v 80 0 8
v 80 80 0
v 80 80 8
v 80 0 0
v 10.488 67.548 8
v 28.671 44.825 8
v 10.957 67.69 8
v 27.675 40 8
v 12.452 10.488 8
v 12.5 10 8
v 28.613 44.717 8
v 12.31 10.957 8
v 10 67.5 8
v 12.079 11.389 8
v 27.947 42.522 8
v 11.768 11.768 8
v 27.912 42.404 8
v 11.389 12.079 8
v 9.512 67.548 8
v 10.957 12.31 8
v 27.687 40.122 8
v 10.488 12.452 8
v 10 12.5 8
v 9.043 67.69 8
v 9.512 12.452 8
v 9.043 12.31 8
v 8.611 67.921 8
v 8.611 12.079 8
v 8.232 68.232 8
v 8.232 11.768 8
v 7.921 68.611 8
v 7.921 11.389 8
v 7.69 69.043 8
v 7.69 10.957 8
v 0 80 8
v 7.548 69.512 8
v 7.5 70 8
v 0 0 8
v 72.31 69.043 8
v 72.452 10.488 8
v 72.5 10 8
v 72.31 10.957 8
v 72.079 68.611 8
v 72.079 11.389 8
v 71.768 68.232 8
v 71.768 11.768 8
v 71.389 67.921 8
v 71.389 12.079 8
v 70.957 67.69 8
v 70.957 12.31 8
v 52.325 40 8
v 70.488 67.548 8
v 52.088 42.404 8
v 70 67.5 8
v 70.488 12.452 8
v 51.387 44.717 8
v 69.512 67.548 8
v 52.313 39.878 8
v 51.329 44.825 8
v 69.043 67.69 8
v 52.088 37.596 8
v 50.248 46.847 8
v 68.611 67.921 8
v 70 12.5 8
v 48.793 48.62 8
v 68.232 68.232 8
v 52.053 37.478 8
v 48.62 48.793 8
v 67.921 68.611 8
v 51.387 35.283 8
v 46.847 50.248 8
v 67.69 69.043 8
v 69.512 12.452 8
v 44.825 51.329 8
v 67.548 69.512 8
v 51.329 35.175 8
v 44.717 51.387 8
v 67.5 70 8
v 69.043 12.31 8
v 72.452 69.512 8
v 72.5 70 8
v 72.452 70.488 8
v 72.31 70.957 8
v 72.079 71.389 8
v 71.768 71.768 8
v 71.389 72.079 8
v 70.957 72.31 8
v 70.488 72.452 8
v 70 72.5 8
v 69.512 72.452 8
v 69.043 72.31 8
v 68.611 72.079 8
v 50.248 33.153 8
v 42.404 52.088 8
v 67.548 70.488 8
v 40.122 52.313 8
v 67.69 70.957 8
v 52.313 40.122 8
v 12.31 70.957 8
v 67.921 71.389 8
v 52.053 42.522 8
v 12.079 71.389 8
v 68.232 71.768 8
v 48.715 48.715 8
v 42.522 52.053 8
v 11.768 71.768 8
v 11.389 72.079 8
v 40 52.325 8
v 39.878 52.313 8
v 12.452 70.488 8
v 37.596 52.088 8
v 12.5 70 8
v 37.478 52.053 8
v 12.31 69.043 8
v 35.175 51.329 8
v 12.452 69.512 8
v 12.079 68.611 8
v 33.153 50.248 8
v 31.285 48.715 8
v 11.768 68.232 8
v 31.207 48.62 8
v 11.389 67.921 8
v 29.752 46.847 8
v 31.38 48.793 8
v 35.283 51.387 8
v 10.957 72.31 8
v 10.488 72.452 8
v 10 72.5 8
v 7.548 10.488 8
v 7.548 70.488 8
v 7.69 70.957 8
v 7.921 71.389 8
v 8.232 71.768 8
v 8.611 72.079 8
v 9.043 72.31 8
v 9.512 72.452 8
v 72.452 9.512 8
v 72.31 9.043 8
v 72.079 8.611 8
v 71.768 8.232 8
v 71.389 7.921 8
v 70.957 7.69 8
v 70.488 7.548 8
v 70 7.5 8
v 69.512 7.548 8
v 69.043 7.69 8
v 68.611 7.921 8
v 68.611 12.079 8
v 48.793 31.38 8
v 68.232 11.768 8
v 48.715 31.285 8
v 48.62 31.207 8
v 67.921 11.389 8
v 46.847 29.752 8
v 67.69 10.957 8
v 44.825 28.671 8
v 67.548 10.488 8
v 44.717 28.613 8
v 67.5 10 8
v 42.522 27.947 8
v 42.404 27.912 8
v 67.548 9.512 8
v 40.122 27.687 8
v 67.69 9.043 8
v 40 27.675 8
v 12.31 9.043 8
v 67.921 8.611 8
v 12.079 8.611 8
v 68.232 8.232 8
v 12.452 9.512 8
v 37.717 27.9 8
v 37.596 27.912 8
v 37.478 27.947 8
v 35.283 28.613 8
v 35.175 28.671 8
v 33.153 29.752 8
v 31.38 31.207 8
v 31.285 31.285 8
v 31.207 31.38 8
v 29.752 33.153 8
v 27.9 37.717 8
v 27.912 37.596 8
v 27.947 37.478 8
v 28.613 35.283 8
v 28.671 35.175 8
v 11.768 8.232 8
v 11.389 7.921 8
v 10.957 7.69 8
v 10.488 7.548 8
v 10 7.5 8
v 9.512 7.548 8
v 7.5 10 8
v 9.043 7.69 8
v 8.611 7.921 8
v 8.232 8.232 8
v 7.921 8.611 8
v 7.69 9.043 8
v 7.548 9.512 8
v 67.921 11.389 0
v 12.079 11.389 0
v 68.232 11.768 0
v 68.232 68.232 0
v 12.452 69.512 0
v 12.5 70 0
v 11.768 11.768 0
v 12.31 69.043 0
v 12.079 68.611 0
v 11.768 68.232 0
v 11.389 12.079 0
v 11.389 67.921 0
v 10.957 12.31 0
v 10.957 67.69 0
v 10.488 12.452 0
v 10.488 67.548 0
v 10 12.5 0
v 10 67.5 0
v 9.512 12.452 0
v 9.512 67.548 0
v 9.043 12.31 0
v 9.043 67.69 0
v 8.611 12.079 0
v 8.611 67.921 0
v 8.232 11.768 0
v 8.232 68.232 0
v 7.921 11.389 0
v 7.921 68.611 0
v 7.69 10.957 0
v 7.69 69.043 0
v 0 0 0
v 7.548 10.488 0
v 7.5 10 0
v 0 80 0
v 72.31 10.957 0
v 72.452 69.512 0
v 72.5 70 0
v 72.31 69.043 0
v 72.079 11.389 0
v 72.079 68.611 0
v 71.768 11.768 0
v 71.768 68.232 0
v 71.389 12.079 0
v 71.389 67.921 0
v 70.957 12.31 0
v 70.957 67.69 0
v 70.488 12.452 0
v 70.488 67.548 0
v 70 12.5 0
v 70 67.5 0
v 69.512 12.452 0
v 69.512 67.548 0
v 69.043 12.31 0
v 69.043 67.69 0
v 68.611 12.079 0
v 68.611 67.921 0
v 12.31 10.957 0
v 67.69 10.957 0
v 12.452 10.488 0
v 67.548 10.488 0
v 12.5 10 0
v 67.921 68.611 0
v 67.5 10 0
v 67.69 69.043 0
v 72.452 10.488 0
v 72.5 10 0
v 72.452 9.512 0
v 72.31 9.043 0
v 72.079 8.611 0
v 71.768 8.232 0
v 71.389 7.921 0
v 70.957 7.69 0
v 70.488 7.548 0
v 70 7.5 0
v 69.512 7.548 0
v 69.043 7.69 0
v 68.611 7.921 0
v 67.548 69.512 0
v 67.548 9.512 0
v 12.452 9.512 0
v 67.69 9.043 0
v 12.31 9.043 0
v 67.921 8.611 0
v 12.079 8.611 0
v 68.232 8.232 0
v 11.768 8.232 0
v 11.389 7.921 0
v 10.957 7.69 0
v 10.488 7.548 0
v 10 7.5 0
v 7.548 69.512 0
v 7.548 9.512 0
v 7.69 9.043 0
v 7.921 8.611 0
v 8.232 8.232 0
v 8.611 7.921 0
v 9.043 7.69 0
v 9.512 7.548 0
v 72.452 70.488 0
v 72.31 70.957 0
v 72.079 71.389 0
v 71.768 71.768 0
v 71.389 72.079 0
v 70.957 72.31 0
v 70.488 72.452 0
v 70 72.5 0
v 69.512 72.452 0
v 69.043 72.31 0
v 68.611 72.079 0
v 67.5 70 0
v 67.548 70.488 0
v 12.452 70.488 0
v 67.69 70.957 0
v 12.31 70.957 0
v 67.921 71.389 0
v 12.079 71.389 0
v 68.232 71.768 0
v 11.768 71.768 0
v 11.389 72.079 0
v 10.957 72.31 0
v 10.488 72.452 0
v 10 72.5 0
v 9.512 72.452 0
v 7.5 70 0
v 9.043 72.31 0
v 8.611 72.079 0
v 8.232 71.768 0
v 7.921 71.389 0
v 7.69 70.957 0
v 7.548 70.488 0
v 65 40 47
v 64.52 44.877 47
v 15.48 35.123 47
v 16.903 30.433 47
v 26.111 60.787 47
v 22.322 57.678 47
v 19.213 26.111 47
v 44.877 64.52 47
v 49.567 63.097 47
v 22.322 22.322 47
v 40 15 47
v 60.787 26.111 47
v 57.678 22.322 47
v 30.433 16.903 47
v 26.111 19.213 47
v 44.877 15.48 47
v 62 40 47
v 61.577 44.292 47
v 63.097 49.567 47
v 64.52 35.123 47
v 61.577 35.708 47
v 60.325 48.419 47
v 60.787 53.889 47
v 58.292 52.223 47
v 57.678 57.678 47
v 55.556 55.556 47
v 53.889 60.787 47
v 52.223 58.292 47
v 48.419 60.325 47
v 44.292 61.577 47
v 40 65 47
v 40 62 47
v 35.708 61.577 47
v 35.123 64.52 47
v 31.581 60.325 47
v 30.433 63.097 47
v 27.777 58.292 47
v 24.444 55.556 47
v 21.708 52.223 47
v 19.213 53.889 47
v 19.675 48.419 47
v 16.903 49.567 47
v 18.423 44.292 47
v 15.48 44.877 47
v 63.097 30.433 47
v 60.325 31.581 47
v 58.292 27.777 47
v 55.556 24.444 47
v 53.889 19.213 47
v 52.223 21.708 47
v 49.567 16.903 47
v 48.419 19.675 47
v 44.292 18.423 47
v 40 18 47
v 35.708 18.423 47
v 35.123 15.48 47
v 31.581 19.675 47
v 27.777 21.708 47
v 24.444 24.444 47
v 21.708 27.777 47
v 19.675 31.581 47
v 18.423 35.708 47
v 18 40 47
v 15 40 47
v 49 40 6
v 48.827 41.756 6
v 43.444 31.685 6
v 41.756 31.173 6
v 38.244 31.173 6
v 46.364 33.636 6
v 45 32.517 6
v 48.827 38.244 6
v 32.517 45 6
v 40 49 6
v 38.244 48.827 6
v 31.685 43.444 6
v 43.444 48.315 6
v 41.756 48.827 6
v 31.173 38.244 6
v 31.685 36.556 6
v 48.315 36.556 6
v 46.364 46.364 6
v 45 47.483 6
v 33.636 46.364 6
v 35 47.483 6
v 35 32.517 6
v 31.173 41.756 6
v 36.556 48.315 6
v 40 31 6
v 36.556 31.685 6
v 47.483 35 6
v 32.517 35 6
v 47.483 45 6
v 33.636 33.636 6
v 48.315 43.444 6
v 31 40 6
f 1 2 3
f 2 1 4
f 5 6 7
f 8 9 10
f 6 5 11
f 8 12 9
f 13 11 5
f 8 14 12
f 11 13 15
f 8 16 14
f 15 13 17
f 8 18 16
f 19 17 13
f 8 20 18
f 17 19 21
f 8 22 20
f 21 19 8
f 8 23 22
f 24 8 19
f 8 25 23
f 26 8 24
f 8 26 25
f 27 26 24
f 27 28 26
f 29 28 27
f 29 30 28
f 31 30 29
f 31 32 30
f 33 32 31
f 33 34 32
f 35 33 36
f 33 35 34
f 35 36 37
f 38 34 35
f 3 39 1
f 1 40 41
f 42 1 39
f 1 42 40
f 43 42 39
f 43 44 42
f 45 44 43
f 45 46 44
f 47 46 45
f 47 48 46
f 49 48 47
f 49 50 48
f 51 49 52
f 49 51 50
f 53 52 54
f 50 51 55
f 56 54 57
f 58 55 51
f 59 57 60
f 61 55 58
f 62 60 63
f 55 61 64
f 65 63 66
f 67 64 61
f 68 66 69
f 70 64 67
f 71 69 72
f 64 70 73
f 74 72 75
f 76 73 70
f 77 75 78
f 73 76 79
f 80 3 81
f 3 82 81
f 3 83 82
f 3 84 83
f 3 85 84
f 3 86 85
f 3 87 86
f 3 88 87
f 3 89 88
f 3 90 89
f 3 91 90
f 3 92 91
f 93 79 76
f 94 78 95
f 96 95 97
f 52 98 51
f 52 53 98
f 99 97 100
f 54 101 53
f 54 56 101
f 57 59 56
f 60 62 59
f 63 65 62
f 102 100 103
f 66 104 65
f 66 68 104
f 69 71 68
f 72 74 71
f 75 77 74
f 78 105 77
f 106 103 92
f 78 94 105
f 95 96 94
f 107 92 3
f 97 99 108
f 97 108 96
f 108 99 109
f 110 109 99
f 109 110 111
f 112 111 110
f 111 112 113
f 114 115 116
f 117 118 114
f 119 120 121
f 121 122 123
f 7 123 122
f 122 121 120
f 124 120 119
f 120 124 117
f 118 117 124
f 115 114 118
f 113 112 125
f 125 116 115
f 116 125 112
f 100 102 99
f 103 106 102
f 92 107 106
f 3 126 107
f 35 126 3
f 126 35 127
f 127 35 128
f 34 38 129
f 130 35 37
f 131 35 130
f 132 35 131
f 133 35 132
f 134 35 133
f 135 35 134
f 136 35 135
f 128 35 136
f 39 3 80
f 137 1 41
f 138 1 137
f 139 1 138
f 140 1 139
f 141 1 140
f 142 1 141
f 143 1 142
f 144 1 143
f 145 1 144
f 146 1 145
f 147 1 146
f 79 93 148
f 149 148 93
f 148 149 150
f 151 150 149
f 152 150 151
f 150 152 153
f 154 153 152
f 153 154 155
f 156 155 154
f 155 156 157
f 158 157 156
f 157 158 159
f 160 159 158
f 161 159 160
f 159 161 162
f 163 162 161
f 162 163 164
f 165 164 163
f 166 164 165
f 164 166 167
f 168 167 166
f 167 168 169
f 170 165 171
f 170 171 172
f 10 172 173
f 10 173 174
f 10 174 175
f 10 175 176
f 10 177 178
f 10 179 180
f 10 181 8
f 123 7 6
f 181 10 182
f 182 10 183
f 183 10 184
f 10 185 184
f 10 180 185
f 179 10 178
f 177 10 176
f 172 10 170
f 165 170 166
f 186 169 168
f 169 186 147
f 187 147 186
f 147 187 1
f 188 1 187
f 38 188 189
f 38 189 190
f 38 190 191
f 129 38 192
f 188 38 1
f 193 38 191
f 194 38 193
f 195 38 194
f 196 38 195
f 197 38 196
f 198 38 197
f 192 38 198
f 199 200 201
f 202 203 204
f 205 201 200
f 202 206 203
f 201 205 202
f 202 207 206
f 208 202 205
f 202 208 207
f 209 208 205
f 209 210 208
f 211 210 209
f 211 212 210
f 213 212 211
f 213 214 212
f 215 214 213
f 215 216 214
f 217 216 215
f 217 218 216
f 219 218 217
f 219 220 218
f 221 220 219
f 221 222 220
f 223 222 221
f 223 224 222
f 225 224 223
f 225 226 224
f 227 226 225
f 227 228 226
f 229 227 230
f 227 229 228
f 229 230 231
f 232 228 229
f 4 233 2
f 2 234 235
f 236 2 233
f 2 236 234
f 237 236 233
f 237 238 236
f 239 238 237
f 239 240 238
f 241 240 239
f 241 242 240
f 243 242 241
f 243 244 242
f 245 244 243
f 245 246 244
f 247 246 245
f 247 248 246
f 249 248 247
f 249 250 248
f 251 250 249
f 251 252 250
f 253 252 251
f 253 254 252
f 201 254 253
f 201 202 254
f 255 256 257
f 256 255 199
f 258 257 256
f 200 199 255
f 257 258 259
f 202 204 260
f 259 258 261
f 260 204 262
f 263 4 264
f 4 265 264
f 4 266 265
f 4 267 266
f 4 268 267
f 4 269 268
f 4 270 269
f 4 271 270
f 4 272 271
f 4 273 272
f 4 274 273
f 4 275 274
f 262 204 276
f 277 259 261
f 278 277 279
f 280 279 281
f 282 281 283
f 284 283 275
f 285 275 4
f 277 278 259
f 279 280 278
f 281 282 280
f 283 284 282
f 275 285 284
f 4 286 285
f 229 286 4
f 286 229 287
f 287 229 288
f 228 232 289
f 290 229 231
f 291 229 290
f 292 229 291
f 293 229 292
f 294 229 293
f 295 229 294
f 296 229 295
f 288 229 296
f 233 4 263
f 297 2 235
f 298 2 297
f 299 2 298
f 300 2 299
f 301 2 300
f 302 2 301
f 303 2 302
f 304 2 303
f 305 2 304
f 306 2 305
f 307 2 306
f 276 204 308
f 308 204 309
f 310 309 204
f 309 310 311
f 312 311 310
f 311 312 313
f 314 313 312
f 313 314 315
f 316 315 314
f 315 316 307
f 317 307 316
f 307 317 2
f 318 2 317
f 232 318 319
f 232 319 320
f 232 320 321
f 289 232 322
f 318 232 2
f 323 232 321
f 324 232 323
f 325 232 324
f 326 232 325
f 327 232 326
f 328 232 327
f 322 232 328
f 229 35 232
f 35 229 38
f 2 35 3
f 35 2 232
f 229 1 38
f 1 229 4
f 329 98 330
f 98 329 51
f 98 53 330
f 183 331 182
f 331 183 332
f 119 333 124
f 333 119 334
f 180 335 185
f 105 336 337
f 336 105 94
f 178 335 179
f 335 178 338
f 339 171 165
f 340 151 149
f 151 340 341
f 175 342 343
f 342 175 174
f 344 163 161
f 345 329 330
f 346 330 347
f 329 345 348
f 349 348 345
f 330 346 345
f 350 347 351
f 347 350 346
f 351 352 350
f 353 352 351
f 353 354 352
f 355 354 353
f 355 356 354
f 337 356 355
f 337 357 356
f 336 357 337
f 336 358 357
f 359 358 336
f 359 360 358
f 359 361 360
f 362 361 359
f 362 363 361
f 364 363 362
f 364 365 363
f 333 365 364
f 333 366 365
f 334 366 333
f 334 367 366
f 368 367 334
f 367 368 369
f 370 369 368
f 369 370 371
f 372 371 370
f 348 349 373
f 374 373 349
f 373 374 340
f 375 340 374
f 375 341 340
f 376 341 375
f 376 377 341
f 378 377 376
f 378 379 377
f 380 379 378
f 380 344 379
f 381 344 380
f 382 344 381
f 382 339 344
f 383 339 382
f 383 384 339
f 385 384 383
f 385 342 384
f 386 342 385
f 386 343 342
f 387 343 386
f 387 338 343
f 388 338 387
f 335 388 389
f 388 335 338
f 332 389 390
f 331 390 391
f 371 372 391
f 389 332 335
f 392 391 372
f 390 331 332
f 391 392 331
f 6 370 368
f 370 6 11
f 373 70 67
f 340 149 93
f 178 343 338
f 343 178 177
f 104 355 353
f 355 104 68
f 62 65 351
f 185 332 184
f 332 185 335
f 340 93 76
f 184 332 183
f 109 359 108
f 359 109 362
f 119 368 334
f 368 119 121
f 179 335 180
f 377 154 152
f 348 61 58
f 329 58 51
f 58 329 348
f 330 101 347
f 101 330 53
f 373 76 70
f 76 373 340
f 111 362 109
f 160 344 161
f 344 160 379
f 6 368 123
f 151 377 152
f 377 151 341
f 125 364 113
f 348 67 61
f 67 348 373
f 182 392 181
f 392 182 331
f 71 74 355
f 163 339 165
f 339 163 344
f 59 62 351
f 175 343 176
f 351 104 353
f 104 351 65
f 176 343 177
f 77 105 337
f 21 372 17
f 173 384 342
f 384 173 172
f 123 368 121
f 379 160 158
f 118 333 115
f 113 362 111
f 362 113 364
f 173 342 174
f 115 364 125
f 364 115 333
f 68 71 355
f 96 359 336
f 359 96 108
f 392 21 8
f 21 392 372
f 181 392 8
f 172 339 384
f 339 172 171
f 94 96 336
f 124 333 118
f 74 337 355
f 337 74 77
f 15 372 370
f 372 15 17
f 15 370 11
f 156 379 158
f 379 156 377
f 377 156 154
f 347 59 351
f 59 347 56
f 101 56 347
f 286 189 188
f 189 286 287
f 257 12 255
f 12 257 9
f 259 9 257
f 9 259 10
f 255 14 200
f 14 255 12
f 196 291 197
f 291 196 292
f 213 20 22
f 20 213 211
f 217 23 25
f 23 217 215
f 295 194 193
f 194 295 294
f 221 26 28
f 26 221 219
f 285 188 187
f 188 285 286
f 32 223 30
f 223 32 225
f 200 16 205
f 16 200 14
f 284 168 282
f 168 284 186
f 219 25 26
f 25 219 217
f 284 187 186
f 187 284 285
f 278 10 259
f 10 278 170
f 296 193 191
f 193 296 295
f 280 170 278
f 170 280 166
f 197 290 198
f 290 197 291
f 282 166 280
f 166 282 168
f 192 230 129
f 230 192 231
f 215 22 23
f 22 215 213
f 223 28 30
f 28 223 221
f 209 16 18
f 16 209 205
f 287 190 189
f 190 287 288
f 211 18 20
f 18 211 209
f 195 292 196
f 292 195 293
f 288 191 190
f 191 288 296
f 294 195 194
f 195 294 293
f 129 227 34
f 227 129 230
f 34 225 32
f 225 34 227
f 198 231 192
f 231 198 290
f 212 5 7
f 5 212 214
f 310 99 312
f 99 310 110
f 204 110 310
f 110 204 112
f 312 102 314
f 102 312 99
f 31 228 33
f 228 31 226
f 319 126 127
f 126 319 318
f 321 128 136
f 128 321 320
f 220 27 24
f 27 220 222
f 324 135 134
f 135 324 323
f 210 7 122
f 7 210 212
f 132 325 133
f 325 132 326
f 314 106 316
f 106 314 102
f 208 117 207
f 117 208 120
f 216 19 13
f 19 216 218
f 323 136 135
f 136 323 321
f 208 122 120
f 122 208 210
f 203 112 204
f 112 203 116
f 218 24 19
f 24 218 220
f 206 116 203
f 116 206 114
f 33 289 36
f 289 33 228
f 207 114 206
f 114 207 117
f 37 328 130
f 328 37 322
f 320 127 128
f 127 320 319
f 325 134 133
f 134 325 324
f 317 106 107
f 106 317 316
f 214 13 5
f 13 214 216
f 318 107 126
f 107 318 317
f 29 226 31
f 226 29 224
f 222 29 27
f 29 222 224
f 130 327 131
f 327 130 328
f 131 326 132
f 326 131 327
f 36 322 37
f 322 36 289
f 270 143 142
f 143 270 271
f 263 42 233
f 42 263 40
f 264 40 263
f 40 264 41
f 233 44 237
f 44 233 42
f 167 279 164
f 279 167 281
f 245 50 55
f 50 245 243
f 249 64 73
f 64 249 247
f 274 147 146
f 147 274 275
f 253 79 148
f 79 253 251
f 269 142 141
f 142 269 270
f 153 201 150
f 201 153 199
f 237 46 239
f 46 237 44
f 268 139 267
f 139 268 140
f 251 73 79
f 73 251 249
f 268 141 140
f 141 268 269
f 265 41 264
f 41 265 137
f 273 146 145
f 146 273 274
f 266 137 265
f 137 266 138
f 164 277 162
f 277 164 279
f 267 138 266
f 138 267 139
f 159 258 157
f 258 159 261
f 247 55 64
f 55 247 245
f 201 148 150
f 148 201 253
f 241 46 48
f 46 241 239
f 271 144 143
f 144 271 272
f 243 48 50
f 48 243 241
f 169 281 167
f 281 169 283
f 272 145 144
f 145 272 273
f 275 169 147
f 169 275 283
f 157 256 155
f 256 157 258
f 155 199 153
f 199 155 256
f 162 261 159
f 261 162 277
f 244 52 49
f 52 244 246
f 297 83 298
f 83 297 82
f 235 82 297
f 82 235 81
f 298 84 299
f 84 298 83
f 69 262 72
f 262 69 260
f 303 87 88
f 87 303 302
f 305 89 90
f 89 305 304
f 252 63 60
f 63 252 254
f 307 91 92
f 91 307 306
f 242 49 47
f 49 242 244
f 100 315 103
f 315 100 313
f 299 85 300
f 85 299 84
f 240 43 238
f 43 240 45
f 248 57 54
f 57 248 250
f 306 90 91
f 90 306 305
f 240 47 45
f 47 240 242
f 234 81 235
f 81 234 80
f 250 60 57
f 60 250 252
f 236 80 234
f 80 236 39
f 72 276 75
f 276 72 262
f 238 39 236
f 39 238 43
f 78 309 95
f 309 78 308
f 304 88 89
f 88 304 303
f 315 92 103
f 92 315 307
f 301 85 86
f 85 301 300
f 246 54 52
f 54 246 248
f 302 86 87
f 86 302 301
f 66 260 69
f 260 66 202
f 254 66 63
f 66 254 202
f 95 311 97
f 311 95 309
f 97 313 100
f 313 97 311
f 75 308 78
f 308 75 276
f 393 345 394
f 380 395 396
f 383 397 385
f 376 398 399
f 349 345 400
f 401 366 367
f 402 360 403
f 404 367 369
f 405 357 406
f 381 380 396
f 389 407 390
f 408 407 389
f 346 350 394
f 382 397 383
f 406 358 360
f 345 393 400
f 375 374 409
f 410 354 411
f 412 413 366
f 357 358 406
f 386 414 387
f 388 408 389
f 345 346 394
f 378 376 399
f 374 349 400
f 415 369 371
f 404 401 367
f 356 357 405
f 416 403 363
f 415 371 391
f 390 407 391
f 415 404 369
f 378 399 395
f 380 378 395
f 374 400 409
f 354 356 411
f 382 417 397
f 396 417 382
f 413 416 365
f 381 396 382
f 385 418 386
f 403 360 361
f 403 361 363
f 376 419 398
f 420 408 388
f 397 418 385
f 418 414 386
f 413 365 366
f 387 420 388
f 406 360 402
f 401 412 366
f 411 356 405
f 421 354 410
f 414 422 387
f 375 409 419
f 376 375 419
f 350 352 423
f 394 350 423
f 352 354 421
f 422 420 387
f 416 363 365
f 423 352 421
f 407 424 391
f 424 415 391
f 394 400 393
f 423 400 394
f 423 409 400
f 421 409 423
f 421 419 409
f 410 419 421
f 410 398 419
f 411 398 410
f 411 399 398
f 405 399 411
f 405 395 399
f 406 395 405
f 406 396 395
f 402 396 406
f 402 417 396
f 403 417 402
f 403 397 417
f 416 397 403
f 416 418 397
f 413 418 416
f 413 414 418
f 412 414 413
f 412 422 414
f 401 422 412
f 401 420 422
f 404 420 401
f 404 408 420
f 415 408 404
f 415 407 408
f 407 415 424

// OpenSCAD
$fn = 32;

// ----------------------------------------------------------------------
// Hopper: flanged with square flange
// ----------------------------------------------------------------------

// --- parameters (mm) ---
fl = 80;                  // flange side, X and Y
fl_t = 8;                 // flange thickness
cone_h = 40;              // cone height above the flange
top_d = 50;               // cone mouth diameter
bot_d = 24;               // cone spout diameter
wall = 3;                 // cone wall thickness
hole_r = 2.5;             // flange hole radius
hole_in = 10;             // hole inset from the corners

bore_d = bot_d - 2 * wall;  // spout bore diameter
total_h = fl_t + cone_h - 1;  // overall height

difference() {
  union() {
    cube([fl, fl, fl_t]);
    translate([fl / 2, fl / 2, fl_t - 1])
      cylinder(h = cone_h, d1 = bot_d, d2 = top_d);
  }
  translate([fl / 2, fl / 2, fl_t - 2])
    cylinder(h = cone_h + 1, d1 = bore_d, d2 = top_d - 2 * wall);
  for (sx = [0, 1], sy = [0, 1])
    translate([sx ? fl - hole_in : hole_in,
               sy ? fl - hole_in : hole_in, -1])
      cylinder(r = hole_r, h = fl_t + 2);
}
